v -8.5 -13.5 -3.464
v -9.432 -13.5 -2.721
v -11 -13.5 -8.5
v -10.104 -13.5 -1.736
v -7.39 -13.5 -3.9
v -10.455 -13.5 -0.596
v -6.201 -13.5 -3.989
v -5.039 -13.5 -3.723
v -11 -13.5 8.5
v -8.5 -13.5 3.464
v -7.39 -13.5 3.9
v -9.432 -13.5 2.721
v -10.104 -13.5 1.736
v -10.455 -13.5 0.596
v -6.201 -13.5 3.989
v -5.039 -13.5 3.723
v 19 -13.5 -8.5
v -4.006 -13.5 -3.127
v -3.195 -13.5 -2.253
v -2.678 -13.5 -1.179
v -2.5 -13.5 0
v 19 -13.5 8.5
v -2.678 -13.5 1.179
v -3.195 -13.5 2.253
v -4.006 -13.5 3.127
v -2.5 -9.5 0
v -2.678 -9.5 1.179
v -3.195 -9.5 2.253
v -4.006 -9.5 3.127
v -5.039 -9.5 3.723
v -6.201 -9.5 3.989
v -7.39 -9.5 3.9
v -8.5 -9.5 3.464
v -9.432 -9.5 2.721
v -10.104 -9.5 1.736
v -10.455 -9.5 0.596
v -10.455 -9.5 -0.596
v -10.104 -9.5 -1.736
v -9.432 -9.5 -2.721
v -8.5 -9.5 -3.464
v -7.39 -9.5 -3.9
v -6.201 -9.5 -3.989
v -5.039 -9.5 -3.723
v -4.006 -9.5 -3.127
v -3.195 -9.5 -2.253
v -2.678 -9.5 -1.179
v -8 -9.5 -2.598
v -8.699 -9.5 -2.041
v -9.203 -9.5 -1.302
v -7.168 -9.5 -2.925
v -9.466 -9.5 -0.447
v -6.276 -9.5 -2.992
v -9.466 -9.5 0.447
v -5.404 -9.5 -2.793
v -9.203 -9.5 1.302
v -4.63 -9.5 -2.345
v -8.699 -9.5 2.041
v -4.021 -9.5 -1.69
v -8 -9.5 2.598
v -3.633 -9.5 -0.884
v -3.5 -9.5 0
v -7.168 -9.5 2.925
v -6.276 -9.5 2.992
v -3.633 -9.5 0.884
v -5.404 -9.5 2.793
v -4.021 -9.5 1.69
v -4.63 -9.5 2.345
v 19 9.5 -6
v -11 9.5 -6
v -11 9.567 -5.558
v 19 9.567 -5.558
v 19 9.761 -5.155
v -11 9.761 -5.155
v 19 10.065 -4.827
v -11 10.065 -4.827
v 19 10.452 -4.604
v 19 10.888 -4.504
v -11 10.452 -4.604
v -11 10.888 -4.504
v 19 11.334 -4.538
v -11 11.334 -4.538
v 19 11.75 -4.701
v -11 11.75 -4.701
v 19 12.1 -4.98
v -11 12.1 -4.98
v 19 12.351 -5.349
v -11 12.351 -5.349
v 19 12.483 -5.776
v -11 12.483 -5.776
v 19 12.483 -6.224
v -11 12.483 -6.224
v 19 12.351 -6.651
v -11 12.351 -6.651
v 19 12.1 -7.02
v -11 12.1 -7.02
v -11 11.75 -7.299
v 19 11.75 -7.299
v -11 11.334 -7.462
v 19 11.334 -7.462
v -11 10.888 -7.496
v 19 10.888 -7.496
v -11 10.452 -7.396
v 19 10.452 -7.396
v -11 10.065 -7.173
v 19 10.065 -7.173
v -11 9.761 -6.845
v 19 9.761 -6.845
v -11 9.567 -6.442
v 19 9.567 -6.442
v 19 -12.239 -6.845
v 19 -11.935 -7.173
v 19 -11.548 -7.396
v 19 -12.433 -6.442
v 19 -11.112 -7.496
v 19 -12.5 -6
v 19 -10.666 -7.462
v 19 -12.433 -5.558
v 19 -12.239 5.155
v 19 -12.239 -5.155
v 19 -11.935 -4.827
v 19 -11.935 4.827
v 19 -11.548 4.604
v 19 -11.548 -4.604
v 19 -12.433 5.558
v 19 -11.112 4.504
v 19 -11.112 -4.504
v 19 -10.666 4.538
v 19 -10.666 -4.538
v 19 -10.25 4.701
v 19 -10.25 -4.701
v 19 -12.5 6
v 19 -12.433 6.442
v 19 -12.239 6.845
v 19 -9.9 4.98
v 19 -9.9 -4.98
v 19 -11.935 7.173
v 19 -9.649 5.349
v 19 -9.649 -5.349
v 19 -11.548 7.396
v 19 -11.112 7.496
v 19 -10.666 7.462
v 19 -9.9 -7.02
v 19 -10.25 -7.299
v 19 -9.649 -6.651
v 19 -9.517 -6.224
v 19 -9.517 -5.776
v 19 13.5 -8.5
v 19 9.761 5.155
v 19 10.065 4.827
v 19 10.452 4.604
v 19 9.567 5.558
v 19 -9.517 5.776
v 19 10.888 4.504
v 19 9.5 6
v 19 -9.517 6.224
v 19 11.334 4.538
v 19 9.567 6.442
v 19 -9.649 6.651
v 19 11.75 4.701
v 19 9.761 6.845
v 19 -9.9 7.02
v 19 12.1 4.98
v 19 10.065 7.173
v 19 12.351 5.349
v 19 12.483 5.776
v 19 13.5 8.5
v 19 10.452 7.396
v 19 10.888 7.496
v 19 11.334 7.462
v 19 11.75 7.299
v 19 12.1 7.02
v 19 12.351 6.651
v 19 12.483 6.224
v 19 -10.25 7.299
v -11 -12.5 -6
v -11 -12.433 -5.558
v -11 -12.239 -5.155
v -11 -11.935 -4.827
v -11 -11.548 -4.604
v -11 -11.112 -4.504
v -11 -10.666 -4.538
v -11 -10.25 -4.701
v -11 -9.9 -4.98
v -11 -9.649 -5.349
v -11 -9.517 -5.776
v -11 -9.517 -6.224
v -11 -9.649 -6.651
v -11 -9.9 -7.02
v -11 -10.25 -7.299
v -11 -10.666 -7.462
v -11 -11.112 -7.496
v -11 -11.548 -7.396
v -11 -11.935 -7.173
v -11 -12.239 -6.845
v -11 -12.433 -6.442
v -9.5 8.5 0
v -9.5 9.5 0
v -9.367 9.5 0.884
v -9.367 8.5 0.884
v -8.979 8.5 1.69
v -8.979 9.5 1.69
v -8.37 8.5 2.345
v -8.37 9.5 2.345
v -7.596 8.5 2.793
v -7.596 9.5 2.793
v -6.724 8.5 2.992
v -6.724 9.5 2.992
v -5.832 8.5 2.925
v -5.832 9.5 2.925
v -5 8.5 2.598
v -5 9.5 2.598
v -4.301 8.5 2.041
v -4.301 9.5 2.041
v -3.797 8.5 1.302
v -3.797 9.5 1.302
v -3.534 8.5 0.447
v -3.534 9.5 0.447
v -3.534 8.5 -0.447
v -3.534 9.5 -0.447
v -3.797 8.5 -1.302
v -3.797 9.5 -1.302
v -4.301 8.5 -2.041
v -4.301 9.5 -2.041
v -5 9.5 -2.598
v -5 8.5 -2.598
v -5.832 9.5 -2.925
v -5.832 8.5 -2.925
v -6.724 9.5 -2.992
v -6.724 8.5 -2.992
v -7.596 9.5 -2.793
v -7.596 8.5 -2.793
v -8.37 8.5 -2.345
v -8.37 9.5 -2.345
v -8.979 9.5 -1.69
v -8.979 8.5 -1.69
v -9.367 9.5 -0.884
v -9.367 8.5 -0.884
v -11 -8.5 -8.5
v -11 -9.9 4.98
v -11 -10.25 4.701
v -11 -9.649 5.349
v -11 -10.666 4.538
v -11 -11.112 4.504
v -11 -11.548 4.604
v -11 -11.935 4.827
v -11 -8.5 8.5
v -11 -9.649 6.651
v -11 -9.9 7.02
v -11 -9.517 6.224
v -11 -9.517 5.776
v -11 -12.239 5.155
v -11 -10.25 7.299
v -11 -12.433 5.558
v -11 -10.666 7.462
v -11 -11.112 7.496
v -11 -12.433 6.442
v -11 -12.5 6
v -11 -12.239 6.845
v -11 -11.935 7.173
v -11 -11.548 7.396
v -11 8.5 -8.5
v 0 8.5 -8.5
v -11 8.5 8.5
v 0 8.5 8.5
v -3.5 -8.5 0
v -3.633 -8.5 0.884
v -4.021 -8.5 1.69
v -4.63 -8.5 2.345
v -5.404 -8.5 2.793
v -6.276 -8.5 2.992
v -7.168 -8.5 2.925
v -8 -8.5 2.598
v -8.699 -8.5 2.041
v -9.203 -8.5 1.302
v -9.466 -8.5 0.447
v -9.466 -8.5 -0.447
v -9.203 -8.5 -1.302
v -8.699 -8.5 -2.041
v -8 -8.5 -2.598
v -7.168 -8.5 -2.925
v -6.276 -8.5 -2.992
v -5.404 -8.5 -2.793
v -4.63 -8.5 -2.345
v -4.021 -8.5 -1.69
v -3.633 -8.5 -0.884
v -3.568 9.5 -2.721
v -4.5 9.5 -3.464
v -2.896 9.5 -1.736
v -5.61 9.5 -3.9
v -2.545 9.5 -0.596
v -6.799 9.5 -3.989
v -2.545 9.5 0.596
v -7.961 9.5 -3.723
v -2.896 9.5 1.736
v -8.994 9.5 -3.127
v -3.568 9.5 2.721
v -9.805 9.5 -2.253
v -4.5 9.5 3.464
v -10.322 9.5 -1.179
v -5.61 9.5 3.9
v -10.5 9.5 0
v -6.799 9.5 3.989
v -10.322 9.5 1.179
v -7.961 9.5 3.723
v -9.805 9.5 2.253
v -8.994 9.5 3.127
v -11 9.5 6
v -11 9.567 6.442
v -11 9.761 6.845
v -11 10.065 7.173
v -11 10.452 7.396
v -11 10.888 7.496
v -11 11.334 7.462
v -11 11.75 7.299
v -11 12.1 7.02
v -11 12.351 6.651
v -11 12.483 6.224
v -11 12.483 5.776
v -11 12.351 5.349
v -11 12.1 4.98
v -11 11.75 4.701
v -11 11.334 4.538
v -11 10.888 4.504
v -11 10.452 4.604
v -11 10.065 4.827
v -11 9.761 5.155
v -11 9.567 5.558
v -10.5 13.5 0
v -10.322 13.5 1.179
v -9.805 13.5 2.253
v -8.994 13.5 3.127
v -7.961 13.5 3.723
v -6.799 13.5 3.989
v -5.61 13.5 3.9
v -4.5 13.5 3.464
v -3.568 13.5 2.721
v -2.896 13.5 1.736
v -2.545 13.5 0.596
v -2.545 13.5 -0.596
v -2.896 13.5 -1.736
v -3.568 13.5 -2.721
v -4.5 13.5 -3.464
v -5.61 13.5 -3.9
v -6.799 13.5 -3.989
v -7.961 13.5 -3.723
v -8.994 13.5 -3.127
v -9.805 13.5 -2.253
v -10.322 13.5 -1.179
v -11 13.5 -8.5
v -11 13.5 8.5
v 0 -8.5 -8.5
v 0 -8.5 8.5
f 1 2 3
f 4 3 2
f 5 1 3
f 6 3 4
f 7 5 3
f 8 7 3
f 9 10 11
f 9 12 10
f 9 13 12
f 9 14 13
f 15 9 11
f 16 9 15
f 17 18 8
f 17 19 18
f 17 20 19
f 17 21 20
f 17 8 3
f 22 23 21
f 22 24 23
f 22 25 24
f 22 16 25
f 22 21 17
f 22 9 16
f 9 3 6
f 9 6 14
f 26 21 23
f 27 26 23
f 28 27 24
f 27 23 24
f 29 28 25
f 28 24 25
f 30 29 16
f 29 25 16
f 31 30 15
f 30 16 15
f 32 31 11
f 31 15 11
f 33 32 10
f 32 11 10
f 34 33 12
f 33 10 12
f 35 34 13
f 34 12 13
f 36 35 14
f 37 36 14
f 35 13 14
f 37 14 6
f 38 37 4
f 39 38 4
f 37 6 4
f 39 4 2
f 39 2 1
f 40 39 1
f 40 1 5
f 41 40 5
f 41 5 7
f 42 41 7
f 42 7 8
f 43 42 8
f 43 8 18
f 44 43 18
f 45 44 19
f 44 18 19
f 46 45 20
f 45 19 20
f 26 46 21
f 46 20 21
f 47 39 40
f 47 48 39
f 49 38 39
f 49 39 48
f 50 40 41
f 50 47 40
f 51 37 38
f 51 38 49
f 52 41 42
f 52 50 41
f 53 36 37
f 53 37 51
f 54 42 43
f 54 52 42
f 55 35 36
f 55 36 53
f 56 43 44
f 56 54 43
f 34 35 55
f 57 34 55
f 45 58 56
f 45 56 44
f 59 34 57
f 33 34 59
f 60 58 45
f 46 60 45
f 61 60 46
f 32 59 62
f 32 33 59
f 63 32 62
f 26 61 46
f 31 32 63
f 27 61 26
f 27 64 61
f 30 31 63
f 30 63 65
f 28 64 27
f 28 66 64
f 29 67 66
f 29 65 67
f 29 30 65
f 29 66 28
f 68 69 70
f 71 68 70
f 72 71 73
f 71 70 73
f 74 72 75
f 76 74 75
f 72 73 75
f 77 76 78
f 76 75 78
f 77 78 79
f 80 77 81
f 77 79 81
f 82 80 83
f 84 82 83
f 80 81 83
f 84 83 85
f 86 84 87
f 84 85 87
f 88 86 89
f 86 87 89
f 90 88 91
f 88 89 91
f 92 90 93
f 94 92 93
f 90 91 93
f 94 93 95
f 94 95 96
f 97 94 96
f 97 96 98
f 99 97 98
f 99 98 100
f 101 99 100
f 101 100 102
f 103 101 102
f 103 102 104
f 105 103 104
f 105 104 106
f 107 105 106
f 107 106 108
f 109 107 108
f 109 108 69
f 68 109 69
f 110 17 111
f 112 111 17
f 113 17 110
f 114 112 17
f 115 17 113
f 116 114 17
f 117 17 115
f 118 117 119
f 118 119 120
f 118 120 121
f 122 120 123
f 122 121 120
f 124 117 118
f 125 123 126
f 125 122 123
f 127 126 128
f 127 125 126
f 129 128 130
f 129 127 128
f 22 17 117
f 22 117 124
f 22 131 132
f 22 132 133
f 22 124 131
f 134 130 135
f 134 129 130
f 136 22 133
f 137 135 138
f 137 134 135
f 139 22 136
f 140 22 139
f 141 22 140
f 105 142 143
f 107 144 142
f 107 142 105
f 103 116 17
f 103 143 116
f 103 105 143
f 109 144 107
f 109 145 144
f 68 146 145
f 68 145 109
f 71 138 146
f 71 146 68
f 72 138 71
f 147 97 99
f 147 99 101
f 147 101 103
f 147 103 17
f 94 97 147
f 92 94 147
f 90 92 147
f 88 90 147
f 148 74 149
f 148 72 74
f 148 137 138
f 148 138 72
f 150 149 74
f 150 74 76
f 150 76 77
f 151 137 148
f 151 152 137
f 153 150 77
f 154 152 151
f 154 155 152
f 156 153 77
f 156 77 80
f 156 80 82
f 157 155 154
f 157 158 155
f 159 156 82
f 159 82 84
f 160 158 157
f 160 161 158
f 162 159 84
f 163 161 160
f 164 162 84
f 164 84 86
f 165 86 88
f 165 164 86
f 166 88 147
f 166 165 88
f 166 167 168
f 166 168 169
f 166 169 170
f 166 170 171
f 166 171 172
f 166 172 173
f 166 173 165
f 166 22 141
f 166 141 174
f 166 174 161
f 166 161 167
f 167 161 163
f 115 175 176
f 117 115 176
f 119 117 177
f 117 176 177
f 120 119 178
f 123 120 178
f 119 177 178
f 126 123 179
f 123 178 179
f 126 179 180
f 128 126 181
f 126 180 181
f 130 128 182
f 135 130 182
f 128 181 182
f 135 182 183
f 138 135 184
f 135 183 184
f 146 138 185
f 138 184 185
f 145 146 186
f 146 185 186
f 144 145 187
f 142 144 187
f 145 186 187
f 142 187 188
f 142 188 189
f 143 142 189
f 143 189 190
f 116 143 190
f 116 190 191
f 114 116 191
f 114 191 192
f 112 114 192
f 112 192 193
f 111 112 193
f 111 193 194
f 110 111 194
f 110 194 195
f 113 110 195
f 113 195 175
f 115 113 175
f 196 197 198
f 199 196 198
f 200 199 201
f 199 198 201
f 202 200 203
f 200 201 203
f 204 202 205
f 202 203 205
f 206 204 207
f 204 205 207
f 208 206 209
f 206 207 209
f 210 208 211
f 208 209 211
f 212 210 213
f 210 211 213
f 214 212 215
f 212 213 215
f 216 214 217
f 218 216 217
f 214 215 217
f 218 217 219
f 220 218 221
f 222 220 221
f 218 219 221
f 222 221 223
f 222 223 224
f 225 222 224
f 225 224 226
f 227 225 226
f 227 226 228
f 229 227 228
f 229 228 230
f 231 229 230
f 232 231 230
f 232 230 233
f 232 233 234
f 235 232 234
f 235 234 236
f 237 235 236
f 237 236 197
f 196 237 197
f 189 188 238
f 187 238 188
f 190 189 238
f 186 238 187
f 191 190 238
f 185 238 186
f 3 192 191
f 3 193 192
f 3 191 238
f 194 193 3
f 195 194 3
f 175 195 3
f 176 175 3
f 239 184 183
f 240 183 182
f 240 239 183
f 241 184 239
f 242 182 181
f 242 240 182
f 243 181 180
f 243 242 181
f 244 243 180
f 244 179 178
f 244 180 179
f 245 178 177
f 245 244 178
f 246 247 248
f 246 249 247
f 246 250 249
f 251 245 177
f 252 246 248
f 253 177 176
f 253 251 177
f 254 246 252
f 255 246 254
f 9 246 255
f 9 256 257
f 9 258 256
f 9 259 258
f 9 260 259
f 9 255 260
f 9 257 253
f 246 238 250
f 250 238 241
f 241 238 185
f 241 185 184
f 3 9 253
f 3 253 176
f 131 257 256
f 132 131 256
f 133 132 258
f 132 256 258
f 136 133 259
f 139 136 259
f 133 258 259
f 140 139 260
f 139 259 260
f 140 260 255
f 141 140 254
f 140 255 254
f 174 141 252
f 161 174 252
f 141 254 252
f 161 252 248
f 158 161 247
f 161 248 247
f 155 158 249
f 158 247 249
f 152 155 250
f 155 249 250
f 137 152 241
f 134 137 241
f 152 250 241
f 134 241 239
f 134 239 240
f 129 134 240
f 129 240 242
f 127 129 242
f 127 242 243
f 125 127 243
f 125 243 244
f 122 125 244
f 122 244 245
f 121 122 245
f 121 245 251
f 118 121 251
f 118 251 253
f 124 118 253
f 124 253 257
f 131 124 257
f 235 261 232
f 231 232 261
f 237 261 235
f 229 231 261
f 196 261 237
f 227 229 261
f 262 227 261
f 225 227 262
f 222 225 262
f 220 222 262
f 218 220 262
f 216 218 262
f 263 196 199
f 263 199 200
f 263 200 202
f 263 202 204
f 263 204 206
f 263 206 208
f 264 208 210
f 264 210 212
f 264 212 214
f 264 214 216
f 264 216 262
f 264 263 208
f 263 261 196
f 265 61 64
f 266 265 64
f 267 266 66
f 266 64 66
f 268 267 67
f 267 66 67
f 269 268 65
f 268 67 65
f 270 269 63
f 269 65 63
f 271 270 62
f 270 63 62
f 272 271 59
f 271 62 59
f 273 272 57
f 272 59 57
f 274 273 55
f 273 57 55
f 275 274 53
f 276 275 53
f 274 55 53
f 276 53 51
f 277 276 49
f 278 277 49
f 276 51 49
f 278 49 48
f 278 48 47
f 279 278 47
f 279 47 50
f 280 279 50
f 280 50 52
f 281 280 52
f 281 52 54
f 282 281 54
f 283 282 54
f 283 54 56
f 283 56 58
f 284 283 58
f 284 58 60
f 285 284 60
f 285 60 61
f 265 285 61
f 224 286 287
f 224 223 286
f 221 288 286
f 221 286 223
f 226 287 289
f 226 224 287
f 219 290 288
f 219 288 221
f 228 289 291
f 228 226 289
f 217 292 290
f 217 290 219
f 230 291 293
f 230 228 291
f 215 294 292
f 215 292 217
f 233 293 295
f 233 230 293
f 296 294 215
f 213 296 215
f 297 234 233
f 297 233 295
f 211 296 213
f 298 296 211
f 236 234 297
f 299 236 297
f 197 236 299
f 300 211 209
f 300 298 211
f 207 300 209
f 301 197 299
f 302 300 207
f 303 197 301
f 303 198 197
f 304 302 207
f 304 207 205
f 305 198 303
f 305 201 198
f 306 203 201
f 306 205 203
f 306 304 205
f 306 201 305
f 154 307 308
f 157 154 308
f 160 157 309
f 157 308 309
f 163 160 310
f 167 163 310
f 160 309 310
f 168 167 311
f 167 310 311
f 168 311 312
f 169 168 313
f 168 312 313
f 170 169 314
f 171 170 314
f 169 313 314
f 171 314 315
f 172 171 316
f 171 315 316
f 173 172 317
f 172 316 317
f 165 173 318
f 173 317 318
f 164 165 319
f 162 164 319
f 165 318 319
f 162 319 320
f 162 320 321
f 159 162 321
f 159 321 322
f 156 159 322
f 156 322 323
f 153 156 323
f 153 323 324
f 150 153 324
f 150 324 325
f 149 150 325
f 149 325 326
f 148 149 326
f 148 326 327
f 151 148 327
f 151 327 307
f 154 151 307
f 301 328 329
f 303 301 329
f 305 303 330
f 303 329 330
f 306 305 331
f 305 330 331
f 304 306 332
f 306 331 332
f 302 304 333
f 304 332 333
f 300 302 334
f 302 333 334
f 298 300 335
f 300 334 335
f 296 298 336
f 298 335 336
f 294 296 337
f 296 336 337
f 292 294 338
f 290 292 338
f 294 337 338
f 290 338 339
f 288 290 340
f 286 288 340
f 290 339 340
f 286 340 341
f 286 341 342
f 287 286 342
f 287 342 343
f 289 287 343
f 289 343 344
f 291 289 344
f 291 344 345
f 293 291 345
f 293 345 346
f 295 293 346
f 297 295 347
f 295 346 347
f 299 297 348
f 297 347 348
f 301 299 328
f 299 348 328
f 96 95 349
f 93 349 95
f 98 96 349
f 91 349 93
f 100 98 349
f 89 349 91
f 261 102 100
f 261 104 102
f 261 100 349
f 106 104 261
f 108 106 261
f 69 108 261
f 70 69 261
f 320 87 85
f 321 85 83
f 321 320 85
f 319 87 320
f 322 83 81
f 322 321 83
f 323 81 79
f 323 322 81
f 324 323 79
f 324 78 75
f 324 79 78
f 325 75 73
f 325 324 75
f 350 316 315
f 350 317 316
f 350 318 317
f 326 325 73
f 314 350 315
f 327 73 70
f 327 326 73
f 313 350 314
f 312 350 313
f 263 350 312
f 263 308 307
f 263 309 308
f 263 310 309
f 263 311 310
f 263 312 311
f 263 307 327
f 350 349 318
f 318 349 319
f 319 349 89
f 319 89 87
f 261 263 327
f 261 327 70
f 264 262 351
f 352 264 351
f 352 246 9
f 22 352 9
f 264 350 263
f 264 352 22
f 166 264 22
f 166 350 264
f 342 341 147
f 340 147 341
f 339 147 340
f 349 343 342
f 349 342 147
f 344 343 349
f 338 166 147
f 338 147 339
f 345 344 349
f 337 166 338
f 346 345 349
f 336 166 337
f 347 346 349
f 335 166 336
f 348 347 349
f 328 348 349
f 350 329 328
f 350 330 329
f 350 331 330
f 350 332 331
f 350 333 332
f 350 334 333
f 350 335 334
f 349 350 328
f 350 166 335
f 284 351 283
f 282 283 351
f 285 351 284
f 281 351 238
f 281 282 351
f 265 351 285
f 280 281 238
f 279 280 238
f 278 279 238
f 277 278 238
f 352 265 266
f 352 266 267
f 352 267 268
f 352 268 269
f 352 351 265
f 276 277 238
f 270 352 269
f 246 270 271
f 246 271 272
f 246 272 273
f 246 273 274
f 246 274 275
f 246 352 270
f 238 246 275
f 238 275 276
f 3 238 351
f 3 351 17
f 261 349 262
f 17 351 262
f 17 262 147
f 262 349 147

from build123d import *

# Parameters (mm, degrees)
F1_DEPTH = 8.5
F2_R     = 3
F3_DEPTH = 5
F2_R_2   = 4
F4_DEPTH = 4
F5_R     = 3
F6_DEPTH = 5
F5_R_2   = 4
F7_DEPTH = 4
F9_D     = 3


with BuildPart() as f1:
    # F0 (on Top) → F1 (new body, symmetric)
    with BuildSketch(Plane.XY):
        Polygon((19, 13.5), (-11, 13.5), (-11, 8.5), (0, 8.5), (0, -8.5), (-11, -8.5), (-11, -13.5), (19, -13.5), align=None)
    extrude(amount=F1_DEPTH, both=True)

    # F2 (on face) → F3 (cut, through all)
    with BuildSketch(Plane.XZ.offset(13.5)):
        with Locations((-6.5, 0)):
            Circle(F2_R)
    extrude(amount=-F3_DEPTH, mode=Mode.SUBTRACT)

    # F2 (on face) → F4 (cut)
    with BuildSketch(Plane.XZ.offset(13.5)):
        with Locations((-6.5, 0)):
            Circle(F2_R_2)
        with Locations((-6.5, 0)):
            Circle(F2_R, mode=Mode.SUBTRACT)
    extrude(amount=-F4_DEPTH, mode=Mode.SUBTRACT)

    # F5 (on face) → F6 (cut, through all)
    with BuildSketch(Plane(origin=(0, 13.5, 0), x_dir=(-1, 0, 0), z_dir=(0, 1, 0))):
        with Locations((6.5, 0)):
            Circle(F5_R)
    extrude(amount=-F6_DEPTH, mode=Mode.SUBTRACT)

    # F5 (on face) → F7 (cut)
    with BuildSketch(Plane(origin=(0, 13.5, 0), x_dir=(-1, 0, 0), z_dir=(0, 1, 0))):
        with Locations((6.5, 0)):
            Circle(F5_R_2)
        with Locations((6.5, 0)):
            Circle(F5_R, mode=Mode.SUBTRACT)
    extrude(amount=-F7_DEPTH, mode=Mode.SUBTRACT)

    # F9 (through all)
    with Locations(Plane.YZ.offset(19)):
        with Locations((-11, 6), (-11, -6), (11, -6), (11, 6)):
            Hole(F9_D / 2)


solid = f1.part
